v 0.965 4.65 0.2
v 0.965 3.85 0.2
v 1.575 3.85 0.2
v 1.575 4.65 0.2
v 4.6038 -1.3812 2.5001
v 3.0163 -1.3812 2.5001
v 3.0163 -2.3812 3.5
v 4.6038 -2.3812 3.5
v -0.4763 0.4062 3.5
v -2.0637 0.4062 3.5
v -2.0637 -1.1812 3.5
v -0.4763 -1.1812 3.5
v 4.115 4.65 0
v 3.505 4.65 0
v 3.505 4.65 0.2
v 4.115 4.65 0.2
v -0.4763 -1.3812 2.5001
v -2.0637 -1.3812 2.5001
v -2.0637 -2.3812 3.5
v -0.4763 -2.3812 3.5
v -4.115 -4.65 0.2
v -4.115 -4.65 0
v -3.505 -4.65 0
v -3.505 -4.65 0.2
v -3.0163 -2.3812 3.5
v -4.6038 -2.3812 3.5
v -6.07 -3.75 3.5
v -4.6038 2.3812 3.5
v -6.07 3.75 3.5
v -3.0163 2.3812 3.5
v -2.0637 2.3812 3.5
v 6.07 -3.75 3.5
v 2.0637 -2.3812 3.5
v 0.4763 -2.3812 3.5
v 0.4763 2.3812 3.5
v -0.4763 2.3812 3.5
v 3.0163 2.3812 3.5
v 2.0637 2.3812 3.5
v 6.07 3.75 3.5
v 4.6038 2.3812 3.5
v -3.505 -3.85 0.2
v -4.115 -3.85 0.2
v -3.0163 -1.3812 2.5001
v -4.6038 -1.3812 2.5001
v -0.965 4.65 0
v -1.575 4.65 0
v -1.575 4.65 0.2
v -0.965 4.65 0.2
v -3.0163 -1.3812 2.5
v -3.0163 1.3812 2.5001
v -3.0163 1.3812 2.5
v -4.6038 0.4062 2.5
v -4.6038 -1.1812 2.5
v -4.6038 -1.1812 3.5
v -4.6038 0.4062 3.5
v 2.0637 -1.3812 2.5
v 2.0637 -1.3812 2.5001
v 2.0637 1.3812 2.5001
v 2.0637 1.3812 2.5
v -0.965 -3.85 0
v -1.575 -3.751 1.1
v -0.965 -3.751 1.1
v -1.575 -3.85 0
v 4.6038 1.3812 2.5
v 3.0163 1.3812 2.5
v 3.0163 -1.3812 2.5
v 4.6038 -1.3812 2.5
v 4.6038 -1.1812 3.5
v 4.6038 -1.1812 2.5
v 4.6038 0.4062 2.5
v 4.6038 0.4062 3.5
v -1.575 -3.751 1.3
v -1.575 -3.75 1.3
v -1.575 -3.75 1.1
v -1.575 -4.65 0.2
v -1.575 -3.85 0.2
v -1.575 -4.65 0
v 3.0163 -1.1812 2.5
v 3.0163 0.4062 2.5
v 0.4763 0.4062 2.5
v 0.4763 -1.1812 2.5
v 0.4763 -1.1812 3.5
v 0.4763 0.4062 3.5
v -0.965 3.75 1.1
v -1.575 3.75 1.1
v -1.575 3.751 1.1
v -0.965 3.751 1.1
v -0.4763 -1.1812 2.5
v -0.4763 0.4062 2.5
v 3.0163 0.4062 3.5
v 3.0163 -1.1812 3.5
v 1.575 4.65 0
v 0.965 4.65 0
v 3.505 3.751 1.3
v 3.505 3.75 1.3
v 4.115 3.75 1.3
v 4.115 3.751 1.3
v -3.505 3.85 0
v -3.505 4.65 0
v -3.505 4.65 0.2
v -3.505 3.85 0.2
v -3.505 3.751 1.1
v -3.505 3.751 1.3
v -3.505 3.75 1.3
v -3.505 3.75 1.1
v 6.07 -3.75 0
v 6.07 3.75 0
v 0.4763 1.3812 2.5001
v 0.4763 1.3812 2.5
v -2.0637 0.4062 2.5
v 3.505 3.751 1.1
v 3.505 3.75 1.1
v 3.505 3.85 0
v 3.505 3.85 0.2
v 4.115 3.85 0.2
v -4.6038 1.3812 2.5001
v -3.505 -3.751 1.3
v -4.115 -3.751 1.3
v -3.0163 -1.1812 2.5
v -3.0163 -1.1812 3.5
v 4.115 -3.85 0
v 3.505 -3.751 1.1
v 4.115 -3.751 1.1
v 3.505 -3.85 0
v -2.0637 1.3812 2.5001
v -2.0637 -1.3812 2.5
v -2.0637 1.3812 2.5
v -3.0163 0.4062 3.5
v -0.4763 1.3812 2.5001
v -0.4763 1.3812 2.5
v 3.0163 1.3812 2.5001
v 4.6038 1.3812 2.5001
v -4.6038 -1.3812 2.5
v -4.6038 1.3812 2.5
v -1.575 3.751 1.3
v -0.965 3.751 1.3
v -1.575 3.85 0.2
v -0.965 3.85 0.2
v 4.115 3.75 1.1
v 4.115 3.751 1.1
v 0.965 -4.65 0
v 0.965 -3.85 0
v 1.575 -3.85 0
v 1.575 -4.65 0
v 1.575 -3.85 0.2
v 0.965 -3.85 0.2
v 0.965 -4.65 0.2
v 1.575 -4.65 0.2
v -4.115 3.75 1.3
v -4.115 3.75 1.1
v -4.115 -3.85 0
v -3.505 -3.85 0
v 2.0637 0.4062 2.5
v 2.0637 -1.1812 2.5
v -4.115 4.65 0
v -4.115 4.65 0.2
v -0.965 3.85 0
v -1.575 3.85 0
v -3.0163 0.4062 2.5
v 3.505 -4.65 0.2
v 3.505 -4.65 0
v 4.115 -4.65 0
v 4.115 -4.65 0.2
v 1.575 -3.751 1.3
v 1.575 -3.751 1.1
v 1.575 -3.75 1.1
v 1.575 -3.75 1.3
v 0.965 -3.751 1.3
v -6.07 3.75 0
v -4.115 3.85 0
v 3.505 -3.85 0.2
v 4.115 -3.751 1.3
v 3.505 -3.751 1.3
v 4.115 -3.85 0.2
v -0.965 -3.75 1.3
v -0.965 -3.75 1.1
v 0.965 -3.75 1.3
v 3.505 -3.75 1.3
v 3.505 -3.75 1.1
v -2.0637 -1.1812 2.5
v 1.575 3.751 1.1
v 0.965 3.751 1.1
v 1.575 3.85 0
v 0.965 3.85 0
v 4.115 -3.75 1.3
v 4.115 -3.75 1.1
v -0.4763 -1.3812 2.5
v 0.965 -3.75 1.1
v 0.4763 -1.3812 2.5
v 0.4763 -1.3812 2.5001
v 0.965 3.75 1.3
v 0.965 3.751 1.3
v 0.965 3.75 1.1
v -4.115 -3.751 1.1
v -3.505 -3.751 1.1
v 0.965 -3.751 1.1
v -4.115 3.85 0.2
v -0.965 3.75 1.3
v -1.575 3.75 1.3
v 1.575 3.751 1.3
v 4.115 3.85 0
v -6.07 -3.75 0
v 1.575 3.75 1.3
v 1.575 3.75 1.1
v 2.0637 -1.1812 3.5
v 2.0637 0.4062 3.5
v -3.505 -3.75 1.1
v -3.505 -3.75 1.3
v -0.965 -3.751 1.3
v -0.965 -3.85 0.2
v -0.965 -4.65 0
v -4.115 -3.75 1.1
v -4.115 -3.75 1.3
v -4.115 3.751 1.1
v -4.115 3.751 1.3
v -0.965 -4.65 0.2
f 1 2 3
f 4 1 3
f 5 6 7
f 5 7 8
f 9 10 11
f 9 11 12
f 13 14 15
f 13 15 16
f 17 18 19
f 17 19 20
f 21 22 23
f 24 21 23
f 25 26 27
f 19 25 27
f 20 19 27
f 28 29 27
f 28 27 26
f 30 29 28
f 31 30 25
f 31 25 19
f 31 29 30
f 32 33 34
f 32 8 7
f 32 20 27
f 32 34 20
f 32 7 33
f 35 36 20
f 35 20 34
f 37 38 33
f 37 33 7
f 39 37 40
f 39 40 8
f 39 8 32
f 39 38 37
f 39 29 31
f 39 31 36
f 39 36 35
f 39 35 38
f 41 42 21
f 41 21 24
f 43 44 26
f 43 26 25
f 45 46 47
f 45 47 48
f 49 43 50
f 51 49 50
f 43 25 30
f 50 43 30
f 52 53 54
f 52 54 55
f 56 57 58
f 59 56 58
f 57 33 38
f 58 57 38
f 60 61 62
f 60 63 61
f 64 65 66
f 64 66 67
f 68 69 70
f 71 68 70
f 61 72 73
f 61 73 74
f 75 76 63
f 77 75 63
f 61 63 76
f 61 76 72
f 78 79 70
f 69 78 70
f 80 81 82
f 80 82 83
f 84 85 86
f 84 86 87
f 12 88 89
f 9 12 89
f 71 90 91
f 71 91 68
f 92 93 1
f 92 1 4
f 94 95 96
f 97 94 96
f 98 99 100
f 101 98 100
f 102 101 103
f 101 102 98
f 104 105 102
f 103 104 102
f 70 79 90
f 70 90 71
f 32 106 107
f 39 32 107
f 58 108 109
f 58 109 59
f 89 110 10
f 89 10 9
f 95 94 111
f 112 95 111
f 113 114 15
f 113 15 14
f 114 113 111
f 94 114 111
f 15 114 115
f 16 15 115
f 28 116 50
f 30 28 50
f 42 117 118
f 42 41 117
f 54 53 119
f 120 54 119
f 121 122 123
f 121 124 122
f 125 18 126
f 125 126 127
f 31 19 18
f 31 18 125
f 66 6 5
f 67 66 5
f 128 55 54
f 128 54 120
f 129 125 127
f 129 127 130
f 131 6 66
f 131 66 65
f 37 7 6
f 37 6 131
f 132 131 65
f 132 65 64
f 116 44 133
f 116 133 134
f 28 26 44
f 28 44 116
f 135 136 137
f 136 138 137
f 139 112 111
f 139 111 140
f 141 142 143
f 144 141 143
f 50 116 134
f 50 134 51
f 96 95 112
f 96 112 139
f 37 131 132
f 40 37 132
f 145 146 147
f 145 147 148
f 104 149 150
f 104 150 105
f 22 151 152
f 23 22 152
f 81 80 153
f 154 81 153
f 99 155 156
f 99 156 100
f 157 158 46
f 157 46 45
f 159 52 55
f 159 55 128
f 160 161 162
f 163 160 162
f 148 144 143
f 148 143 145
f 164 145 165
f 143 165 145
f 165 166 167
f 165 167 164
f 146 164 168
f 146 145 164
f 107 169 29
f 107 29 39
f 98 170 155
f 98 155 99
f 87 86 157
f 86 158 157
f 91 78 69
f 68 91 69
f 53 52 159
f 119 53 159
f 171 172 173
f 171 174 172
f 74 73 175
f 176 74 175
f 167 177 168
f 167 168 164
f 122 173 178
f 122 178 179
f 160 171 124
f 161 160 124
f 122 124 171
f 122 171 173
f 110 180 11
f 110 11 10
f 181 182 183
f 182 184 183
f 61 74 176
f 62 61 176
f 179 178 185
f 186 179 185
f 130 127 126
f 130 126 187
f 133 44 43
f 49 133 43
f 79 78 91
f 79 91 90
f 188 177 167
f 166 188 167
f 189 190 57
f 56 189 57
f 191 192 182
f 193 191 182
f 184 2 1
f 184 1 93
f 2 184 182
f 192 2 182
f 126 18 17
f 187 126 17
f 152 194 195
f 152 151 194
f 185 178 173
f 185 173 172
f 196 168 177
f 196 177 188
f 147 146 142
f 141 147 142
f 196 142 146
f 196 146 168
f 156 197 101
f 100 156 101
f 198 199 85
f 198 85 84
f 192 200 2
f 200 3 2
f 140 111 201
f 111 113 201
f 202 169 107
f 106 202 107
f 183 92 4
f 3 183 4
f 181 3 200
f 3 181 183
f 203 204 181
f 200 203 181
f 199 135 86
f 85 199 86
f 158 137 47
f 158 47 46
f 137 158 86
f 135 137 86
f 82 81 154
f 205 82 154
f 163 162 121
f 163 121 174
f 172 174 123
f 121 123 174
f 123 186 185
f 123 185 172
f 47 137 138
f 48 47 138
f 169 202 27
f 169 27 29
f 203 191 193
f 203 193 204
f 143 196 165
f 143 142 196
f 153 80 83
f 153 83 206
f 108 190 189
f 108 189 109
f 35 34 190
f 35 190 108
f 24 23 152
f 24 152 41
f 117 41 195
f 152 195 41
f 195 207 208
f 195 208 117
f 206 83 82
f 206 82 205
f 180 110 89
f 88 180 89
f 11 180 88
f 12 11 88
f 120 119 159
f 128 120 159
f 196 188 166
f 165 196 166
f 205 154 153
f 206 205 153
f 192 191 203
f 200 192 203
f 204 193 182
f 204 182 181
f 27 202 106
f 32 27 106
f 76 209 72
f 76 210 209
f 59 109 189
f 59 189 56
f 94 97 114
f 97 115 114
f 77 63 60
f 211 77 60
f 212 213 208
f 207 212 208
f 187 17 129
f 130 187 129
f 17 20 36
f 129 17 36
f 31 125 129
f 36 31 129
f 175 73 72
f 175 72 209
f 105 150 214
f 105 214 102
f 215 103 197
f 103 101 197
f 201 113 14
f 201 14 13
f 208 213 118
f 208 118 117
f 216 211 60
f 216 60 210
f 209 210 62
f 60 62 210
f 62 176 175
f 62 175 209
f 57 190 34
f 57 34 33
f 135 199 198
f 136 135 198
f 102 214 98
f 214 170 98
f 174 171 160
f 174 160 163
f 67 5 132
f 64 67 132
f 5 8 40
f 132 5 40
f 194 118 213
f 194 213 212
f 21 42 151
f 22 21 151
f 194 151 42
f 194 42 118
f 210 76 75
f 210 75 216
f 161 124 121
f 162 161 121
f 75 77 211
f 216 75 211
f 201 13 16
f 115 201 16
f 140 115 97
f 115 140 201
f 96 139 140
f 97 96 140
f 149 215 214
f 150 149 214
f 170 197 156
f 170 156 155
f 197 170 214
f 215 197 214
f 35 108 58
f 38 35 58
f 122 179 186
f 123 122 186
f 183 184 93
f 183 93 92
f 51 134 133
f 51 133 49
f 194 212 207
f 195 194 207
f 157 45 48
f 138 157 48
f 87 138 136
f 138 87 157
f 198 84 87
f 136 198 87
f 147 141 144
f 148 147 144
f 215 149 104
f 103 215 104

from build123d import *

# Parameters (mm, degrees)
SKETCH_1_W                         = 12.14
SKETCH_1_H                         = 7.5
EXTRUDE_1_DEPTH                    = 3.5
SKETCH_2_W                         = 1.5875
SKETCH_2_H                         = 2.7625
CUT_EXTRUDE_1_DEPTH                = 1
CHAMFER_1_SIZE                     = 1
SKETCH_3_W                         = 1.5875
SKETCH_3_H                         = 1.5875
EXTRUDE_3_DEPTH                    = 1
PATTERN_LINEAR_1_COUNT             = 4
PATTERN_LINEAR_1_PITCH             = 2.54
CHAMFER_1_OF_PATTERN_LINEAR_1_SIZE = 1
PATTERN_LINEAR_2_COUNT             = 4
PATTERN_LINEAR_2_PITCH             = 2.54
SKETCH_4_W                         = 0.61
SKETCH_4_H                         = 0.8
EXTRUDE_4_DEPTH                    = 0.2
SKETCH_5_W                         = 0.61
SKETCH_5_H                         = 0.2
EXTRUDE_5_DEPTH                    = 0.001
PATTERN_LINEAR_3_COUNT             = 4
PATTERN_LINEAR_3_PITCH             = 2.54


with BuildPart() as part:
    # Эскиз1 → Бобышка-Вытянуть1 (new body)
    with BuildSketch(Plane.XY):
        Rectangle(SKETCH_1_W, SKETCH_1_H)
    extrude(amount=EXTRUDE_1_DEPTH)

    # Эскиз2 → Вырез-Вытянуть1 (cut)
    with BuildSketch(Plane.XY.offset(3.5)):
        with Locations((-3.81, 0)):
            Rectangle(SKETCH_2_W, SKETCH_2_H)
    cut_extrude_1 = extrude(amount=-CUT_EXTRUDE_1_DEPTH, mode=Mode.SUBTRACT)

    # Фаска1
    chamfer_1_edges = [part.edges().sort_by_distance(p)[0] for p in [
        (-3.81, 1.38125, 3.5),
        (-3.81, -1.38125, 3.5),
    ]]
    chamfer(chamfer_1_edges, length=CHAMFER_1_SIZE - 0.0001)  # a hair under: the kernel refuses the full size

    # Линейный массив1: Вырез-Вытянуть1 ×4
    with Locations(*[(i * PATTERN_LINEAR_1_PITCH, 0, 0) for i in range(1, PATTERN_LINEAR_1_COUNT)]):
        add(cut_extrude_1, mode=Mode.SUBTRACT)

    # Фаска1 of Линейный массив1
    chamfer_1_of_pattern_linear_1_edges = [part.edges().sort_by_distance(p)[0] for p in [
        (-1.27, 1.38125, 3.5),
        (-1.27, -1.38125, 3.5),
        (1.27, 1.38125, 3.5),
        (1.27, -1.38125, 3.5),
        (3.81, 1.38125, 3.5),
        (3.81, -1.38125, 3.5),
    ]]
    chamfer(chamfer_1_of_pattern_linear_1_edges, length=CHAMFER_1_OF_PATTERN_LINEAR_1_SIZE - 0.0001)  # a hair under: the kernel refuses the full size


with BuildPart() as body_2:
    # Эскиз3 → Бобышка-Вытянуть3 (new body)
    with BuildSketch(Plane.XY.offset(2.5)):
        with Locations((-3.81, -0.3875)):
            Rectangle(SKETCH_3_W, SKETCH_3_H)
    extrude_3 = extrude(amount=EXTRUDE_3_DEPTH)


with BuildPart() as pattern_linear_2_1:
    # Линейный массив2: Бобышка-Вытянуть3 ×4
    with Locations(*[(i * PATTERN_LINEAR_2_PITCH, 0, 0) for i in range(1, PATTERN_LINEAR_2_COUNT)]):
        add(extrude_3)


with BuildPart() as body_6:
    # Эскиз4 → Бобышка-Вытянуть4 (new body)
    with BuildSketch(Plane.XY):
        with Locations((-3.81, -4.25)):
            Rectangle(SKETCH_4_W, SKETCH_4_H)
    extrude(amount=EXTRUDE_4_DEPTH)


with BuildPart() as body_7:
    # Эскиз5 → Бобышка-Вытянуть5 (new body)
    with BuildSketch(Plane.XZ.offset(3.75)):
        with Locations((-3.81, 1.2)):
            Rectangle(SKETCH_5_W, SKETCH_5_H)
    extrude(amount=EXTRUDE_5_DEPTH)


    add(body_6.part)  # loft_1 joins it to this body
    # loft from a face of the part (loft_1)
    loft([body_7.faces().sort_by_distance((-3.81, -3.751, 1.2))[0], body_7.faces().sort_by_distance((-3.81, -3.85, 0.1))[0]])


with BuildPart() as pattern_linear_3_1:
    # Линейный массив3: pattern copy
    add(body_7.part.moved(Location(Vector(1, 0, 0) * (1 * PATTERN_LINEAR_3_PITCH))))


with BuildPart() as pattern_linear_3_2:
    # Линейный массив3: pattern copy
    add(body_7.part.moved(Location(Vector(1, 0, 0) * (2 * PATTERN_LINEAR_3_PITCH))))


with BuildPart() as pattern_linear_3_3:
    # Линейный массив3: pattern copy
    add(body_7.part.moved(Location(Vector(1, 0, 0) * (3 * PATTERN_LINEAR_3_PITCH))))


with BuildPart() as body_10:
    # Зеркальное отражение4: mirrored copy
    add(pattern_linear_3_1.part.mirror(Plane.ZX))


with BuildPart() as body_11:
    # Mirror 4 2: mirrored copy
    add(pattern_linear_3_2.part.mirror(Plane.ZX))


with BuildPart() as body_12:
    # Mirror 4 3: mirrored copy
    add(pattern_linear_3_3.part.mirror(Plane.ZX))


with BuildPart() as body_13:
    # Mirror 4 4: mirrored copy
    add(body_7.part.mirror(Plane.ZX))


solid = Compound([part.part, body_2.part, pattern_linear_2_1.part, body_7.part, pattern_linear_3_1.part, pattern_linear_3_2.part, pattern_linear_3_3.part, body_10.part, body_11.part, body_12.part, body_13.part])
